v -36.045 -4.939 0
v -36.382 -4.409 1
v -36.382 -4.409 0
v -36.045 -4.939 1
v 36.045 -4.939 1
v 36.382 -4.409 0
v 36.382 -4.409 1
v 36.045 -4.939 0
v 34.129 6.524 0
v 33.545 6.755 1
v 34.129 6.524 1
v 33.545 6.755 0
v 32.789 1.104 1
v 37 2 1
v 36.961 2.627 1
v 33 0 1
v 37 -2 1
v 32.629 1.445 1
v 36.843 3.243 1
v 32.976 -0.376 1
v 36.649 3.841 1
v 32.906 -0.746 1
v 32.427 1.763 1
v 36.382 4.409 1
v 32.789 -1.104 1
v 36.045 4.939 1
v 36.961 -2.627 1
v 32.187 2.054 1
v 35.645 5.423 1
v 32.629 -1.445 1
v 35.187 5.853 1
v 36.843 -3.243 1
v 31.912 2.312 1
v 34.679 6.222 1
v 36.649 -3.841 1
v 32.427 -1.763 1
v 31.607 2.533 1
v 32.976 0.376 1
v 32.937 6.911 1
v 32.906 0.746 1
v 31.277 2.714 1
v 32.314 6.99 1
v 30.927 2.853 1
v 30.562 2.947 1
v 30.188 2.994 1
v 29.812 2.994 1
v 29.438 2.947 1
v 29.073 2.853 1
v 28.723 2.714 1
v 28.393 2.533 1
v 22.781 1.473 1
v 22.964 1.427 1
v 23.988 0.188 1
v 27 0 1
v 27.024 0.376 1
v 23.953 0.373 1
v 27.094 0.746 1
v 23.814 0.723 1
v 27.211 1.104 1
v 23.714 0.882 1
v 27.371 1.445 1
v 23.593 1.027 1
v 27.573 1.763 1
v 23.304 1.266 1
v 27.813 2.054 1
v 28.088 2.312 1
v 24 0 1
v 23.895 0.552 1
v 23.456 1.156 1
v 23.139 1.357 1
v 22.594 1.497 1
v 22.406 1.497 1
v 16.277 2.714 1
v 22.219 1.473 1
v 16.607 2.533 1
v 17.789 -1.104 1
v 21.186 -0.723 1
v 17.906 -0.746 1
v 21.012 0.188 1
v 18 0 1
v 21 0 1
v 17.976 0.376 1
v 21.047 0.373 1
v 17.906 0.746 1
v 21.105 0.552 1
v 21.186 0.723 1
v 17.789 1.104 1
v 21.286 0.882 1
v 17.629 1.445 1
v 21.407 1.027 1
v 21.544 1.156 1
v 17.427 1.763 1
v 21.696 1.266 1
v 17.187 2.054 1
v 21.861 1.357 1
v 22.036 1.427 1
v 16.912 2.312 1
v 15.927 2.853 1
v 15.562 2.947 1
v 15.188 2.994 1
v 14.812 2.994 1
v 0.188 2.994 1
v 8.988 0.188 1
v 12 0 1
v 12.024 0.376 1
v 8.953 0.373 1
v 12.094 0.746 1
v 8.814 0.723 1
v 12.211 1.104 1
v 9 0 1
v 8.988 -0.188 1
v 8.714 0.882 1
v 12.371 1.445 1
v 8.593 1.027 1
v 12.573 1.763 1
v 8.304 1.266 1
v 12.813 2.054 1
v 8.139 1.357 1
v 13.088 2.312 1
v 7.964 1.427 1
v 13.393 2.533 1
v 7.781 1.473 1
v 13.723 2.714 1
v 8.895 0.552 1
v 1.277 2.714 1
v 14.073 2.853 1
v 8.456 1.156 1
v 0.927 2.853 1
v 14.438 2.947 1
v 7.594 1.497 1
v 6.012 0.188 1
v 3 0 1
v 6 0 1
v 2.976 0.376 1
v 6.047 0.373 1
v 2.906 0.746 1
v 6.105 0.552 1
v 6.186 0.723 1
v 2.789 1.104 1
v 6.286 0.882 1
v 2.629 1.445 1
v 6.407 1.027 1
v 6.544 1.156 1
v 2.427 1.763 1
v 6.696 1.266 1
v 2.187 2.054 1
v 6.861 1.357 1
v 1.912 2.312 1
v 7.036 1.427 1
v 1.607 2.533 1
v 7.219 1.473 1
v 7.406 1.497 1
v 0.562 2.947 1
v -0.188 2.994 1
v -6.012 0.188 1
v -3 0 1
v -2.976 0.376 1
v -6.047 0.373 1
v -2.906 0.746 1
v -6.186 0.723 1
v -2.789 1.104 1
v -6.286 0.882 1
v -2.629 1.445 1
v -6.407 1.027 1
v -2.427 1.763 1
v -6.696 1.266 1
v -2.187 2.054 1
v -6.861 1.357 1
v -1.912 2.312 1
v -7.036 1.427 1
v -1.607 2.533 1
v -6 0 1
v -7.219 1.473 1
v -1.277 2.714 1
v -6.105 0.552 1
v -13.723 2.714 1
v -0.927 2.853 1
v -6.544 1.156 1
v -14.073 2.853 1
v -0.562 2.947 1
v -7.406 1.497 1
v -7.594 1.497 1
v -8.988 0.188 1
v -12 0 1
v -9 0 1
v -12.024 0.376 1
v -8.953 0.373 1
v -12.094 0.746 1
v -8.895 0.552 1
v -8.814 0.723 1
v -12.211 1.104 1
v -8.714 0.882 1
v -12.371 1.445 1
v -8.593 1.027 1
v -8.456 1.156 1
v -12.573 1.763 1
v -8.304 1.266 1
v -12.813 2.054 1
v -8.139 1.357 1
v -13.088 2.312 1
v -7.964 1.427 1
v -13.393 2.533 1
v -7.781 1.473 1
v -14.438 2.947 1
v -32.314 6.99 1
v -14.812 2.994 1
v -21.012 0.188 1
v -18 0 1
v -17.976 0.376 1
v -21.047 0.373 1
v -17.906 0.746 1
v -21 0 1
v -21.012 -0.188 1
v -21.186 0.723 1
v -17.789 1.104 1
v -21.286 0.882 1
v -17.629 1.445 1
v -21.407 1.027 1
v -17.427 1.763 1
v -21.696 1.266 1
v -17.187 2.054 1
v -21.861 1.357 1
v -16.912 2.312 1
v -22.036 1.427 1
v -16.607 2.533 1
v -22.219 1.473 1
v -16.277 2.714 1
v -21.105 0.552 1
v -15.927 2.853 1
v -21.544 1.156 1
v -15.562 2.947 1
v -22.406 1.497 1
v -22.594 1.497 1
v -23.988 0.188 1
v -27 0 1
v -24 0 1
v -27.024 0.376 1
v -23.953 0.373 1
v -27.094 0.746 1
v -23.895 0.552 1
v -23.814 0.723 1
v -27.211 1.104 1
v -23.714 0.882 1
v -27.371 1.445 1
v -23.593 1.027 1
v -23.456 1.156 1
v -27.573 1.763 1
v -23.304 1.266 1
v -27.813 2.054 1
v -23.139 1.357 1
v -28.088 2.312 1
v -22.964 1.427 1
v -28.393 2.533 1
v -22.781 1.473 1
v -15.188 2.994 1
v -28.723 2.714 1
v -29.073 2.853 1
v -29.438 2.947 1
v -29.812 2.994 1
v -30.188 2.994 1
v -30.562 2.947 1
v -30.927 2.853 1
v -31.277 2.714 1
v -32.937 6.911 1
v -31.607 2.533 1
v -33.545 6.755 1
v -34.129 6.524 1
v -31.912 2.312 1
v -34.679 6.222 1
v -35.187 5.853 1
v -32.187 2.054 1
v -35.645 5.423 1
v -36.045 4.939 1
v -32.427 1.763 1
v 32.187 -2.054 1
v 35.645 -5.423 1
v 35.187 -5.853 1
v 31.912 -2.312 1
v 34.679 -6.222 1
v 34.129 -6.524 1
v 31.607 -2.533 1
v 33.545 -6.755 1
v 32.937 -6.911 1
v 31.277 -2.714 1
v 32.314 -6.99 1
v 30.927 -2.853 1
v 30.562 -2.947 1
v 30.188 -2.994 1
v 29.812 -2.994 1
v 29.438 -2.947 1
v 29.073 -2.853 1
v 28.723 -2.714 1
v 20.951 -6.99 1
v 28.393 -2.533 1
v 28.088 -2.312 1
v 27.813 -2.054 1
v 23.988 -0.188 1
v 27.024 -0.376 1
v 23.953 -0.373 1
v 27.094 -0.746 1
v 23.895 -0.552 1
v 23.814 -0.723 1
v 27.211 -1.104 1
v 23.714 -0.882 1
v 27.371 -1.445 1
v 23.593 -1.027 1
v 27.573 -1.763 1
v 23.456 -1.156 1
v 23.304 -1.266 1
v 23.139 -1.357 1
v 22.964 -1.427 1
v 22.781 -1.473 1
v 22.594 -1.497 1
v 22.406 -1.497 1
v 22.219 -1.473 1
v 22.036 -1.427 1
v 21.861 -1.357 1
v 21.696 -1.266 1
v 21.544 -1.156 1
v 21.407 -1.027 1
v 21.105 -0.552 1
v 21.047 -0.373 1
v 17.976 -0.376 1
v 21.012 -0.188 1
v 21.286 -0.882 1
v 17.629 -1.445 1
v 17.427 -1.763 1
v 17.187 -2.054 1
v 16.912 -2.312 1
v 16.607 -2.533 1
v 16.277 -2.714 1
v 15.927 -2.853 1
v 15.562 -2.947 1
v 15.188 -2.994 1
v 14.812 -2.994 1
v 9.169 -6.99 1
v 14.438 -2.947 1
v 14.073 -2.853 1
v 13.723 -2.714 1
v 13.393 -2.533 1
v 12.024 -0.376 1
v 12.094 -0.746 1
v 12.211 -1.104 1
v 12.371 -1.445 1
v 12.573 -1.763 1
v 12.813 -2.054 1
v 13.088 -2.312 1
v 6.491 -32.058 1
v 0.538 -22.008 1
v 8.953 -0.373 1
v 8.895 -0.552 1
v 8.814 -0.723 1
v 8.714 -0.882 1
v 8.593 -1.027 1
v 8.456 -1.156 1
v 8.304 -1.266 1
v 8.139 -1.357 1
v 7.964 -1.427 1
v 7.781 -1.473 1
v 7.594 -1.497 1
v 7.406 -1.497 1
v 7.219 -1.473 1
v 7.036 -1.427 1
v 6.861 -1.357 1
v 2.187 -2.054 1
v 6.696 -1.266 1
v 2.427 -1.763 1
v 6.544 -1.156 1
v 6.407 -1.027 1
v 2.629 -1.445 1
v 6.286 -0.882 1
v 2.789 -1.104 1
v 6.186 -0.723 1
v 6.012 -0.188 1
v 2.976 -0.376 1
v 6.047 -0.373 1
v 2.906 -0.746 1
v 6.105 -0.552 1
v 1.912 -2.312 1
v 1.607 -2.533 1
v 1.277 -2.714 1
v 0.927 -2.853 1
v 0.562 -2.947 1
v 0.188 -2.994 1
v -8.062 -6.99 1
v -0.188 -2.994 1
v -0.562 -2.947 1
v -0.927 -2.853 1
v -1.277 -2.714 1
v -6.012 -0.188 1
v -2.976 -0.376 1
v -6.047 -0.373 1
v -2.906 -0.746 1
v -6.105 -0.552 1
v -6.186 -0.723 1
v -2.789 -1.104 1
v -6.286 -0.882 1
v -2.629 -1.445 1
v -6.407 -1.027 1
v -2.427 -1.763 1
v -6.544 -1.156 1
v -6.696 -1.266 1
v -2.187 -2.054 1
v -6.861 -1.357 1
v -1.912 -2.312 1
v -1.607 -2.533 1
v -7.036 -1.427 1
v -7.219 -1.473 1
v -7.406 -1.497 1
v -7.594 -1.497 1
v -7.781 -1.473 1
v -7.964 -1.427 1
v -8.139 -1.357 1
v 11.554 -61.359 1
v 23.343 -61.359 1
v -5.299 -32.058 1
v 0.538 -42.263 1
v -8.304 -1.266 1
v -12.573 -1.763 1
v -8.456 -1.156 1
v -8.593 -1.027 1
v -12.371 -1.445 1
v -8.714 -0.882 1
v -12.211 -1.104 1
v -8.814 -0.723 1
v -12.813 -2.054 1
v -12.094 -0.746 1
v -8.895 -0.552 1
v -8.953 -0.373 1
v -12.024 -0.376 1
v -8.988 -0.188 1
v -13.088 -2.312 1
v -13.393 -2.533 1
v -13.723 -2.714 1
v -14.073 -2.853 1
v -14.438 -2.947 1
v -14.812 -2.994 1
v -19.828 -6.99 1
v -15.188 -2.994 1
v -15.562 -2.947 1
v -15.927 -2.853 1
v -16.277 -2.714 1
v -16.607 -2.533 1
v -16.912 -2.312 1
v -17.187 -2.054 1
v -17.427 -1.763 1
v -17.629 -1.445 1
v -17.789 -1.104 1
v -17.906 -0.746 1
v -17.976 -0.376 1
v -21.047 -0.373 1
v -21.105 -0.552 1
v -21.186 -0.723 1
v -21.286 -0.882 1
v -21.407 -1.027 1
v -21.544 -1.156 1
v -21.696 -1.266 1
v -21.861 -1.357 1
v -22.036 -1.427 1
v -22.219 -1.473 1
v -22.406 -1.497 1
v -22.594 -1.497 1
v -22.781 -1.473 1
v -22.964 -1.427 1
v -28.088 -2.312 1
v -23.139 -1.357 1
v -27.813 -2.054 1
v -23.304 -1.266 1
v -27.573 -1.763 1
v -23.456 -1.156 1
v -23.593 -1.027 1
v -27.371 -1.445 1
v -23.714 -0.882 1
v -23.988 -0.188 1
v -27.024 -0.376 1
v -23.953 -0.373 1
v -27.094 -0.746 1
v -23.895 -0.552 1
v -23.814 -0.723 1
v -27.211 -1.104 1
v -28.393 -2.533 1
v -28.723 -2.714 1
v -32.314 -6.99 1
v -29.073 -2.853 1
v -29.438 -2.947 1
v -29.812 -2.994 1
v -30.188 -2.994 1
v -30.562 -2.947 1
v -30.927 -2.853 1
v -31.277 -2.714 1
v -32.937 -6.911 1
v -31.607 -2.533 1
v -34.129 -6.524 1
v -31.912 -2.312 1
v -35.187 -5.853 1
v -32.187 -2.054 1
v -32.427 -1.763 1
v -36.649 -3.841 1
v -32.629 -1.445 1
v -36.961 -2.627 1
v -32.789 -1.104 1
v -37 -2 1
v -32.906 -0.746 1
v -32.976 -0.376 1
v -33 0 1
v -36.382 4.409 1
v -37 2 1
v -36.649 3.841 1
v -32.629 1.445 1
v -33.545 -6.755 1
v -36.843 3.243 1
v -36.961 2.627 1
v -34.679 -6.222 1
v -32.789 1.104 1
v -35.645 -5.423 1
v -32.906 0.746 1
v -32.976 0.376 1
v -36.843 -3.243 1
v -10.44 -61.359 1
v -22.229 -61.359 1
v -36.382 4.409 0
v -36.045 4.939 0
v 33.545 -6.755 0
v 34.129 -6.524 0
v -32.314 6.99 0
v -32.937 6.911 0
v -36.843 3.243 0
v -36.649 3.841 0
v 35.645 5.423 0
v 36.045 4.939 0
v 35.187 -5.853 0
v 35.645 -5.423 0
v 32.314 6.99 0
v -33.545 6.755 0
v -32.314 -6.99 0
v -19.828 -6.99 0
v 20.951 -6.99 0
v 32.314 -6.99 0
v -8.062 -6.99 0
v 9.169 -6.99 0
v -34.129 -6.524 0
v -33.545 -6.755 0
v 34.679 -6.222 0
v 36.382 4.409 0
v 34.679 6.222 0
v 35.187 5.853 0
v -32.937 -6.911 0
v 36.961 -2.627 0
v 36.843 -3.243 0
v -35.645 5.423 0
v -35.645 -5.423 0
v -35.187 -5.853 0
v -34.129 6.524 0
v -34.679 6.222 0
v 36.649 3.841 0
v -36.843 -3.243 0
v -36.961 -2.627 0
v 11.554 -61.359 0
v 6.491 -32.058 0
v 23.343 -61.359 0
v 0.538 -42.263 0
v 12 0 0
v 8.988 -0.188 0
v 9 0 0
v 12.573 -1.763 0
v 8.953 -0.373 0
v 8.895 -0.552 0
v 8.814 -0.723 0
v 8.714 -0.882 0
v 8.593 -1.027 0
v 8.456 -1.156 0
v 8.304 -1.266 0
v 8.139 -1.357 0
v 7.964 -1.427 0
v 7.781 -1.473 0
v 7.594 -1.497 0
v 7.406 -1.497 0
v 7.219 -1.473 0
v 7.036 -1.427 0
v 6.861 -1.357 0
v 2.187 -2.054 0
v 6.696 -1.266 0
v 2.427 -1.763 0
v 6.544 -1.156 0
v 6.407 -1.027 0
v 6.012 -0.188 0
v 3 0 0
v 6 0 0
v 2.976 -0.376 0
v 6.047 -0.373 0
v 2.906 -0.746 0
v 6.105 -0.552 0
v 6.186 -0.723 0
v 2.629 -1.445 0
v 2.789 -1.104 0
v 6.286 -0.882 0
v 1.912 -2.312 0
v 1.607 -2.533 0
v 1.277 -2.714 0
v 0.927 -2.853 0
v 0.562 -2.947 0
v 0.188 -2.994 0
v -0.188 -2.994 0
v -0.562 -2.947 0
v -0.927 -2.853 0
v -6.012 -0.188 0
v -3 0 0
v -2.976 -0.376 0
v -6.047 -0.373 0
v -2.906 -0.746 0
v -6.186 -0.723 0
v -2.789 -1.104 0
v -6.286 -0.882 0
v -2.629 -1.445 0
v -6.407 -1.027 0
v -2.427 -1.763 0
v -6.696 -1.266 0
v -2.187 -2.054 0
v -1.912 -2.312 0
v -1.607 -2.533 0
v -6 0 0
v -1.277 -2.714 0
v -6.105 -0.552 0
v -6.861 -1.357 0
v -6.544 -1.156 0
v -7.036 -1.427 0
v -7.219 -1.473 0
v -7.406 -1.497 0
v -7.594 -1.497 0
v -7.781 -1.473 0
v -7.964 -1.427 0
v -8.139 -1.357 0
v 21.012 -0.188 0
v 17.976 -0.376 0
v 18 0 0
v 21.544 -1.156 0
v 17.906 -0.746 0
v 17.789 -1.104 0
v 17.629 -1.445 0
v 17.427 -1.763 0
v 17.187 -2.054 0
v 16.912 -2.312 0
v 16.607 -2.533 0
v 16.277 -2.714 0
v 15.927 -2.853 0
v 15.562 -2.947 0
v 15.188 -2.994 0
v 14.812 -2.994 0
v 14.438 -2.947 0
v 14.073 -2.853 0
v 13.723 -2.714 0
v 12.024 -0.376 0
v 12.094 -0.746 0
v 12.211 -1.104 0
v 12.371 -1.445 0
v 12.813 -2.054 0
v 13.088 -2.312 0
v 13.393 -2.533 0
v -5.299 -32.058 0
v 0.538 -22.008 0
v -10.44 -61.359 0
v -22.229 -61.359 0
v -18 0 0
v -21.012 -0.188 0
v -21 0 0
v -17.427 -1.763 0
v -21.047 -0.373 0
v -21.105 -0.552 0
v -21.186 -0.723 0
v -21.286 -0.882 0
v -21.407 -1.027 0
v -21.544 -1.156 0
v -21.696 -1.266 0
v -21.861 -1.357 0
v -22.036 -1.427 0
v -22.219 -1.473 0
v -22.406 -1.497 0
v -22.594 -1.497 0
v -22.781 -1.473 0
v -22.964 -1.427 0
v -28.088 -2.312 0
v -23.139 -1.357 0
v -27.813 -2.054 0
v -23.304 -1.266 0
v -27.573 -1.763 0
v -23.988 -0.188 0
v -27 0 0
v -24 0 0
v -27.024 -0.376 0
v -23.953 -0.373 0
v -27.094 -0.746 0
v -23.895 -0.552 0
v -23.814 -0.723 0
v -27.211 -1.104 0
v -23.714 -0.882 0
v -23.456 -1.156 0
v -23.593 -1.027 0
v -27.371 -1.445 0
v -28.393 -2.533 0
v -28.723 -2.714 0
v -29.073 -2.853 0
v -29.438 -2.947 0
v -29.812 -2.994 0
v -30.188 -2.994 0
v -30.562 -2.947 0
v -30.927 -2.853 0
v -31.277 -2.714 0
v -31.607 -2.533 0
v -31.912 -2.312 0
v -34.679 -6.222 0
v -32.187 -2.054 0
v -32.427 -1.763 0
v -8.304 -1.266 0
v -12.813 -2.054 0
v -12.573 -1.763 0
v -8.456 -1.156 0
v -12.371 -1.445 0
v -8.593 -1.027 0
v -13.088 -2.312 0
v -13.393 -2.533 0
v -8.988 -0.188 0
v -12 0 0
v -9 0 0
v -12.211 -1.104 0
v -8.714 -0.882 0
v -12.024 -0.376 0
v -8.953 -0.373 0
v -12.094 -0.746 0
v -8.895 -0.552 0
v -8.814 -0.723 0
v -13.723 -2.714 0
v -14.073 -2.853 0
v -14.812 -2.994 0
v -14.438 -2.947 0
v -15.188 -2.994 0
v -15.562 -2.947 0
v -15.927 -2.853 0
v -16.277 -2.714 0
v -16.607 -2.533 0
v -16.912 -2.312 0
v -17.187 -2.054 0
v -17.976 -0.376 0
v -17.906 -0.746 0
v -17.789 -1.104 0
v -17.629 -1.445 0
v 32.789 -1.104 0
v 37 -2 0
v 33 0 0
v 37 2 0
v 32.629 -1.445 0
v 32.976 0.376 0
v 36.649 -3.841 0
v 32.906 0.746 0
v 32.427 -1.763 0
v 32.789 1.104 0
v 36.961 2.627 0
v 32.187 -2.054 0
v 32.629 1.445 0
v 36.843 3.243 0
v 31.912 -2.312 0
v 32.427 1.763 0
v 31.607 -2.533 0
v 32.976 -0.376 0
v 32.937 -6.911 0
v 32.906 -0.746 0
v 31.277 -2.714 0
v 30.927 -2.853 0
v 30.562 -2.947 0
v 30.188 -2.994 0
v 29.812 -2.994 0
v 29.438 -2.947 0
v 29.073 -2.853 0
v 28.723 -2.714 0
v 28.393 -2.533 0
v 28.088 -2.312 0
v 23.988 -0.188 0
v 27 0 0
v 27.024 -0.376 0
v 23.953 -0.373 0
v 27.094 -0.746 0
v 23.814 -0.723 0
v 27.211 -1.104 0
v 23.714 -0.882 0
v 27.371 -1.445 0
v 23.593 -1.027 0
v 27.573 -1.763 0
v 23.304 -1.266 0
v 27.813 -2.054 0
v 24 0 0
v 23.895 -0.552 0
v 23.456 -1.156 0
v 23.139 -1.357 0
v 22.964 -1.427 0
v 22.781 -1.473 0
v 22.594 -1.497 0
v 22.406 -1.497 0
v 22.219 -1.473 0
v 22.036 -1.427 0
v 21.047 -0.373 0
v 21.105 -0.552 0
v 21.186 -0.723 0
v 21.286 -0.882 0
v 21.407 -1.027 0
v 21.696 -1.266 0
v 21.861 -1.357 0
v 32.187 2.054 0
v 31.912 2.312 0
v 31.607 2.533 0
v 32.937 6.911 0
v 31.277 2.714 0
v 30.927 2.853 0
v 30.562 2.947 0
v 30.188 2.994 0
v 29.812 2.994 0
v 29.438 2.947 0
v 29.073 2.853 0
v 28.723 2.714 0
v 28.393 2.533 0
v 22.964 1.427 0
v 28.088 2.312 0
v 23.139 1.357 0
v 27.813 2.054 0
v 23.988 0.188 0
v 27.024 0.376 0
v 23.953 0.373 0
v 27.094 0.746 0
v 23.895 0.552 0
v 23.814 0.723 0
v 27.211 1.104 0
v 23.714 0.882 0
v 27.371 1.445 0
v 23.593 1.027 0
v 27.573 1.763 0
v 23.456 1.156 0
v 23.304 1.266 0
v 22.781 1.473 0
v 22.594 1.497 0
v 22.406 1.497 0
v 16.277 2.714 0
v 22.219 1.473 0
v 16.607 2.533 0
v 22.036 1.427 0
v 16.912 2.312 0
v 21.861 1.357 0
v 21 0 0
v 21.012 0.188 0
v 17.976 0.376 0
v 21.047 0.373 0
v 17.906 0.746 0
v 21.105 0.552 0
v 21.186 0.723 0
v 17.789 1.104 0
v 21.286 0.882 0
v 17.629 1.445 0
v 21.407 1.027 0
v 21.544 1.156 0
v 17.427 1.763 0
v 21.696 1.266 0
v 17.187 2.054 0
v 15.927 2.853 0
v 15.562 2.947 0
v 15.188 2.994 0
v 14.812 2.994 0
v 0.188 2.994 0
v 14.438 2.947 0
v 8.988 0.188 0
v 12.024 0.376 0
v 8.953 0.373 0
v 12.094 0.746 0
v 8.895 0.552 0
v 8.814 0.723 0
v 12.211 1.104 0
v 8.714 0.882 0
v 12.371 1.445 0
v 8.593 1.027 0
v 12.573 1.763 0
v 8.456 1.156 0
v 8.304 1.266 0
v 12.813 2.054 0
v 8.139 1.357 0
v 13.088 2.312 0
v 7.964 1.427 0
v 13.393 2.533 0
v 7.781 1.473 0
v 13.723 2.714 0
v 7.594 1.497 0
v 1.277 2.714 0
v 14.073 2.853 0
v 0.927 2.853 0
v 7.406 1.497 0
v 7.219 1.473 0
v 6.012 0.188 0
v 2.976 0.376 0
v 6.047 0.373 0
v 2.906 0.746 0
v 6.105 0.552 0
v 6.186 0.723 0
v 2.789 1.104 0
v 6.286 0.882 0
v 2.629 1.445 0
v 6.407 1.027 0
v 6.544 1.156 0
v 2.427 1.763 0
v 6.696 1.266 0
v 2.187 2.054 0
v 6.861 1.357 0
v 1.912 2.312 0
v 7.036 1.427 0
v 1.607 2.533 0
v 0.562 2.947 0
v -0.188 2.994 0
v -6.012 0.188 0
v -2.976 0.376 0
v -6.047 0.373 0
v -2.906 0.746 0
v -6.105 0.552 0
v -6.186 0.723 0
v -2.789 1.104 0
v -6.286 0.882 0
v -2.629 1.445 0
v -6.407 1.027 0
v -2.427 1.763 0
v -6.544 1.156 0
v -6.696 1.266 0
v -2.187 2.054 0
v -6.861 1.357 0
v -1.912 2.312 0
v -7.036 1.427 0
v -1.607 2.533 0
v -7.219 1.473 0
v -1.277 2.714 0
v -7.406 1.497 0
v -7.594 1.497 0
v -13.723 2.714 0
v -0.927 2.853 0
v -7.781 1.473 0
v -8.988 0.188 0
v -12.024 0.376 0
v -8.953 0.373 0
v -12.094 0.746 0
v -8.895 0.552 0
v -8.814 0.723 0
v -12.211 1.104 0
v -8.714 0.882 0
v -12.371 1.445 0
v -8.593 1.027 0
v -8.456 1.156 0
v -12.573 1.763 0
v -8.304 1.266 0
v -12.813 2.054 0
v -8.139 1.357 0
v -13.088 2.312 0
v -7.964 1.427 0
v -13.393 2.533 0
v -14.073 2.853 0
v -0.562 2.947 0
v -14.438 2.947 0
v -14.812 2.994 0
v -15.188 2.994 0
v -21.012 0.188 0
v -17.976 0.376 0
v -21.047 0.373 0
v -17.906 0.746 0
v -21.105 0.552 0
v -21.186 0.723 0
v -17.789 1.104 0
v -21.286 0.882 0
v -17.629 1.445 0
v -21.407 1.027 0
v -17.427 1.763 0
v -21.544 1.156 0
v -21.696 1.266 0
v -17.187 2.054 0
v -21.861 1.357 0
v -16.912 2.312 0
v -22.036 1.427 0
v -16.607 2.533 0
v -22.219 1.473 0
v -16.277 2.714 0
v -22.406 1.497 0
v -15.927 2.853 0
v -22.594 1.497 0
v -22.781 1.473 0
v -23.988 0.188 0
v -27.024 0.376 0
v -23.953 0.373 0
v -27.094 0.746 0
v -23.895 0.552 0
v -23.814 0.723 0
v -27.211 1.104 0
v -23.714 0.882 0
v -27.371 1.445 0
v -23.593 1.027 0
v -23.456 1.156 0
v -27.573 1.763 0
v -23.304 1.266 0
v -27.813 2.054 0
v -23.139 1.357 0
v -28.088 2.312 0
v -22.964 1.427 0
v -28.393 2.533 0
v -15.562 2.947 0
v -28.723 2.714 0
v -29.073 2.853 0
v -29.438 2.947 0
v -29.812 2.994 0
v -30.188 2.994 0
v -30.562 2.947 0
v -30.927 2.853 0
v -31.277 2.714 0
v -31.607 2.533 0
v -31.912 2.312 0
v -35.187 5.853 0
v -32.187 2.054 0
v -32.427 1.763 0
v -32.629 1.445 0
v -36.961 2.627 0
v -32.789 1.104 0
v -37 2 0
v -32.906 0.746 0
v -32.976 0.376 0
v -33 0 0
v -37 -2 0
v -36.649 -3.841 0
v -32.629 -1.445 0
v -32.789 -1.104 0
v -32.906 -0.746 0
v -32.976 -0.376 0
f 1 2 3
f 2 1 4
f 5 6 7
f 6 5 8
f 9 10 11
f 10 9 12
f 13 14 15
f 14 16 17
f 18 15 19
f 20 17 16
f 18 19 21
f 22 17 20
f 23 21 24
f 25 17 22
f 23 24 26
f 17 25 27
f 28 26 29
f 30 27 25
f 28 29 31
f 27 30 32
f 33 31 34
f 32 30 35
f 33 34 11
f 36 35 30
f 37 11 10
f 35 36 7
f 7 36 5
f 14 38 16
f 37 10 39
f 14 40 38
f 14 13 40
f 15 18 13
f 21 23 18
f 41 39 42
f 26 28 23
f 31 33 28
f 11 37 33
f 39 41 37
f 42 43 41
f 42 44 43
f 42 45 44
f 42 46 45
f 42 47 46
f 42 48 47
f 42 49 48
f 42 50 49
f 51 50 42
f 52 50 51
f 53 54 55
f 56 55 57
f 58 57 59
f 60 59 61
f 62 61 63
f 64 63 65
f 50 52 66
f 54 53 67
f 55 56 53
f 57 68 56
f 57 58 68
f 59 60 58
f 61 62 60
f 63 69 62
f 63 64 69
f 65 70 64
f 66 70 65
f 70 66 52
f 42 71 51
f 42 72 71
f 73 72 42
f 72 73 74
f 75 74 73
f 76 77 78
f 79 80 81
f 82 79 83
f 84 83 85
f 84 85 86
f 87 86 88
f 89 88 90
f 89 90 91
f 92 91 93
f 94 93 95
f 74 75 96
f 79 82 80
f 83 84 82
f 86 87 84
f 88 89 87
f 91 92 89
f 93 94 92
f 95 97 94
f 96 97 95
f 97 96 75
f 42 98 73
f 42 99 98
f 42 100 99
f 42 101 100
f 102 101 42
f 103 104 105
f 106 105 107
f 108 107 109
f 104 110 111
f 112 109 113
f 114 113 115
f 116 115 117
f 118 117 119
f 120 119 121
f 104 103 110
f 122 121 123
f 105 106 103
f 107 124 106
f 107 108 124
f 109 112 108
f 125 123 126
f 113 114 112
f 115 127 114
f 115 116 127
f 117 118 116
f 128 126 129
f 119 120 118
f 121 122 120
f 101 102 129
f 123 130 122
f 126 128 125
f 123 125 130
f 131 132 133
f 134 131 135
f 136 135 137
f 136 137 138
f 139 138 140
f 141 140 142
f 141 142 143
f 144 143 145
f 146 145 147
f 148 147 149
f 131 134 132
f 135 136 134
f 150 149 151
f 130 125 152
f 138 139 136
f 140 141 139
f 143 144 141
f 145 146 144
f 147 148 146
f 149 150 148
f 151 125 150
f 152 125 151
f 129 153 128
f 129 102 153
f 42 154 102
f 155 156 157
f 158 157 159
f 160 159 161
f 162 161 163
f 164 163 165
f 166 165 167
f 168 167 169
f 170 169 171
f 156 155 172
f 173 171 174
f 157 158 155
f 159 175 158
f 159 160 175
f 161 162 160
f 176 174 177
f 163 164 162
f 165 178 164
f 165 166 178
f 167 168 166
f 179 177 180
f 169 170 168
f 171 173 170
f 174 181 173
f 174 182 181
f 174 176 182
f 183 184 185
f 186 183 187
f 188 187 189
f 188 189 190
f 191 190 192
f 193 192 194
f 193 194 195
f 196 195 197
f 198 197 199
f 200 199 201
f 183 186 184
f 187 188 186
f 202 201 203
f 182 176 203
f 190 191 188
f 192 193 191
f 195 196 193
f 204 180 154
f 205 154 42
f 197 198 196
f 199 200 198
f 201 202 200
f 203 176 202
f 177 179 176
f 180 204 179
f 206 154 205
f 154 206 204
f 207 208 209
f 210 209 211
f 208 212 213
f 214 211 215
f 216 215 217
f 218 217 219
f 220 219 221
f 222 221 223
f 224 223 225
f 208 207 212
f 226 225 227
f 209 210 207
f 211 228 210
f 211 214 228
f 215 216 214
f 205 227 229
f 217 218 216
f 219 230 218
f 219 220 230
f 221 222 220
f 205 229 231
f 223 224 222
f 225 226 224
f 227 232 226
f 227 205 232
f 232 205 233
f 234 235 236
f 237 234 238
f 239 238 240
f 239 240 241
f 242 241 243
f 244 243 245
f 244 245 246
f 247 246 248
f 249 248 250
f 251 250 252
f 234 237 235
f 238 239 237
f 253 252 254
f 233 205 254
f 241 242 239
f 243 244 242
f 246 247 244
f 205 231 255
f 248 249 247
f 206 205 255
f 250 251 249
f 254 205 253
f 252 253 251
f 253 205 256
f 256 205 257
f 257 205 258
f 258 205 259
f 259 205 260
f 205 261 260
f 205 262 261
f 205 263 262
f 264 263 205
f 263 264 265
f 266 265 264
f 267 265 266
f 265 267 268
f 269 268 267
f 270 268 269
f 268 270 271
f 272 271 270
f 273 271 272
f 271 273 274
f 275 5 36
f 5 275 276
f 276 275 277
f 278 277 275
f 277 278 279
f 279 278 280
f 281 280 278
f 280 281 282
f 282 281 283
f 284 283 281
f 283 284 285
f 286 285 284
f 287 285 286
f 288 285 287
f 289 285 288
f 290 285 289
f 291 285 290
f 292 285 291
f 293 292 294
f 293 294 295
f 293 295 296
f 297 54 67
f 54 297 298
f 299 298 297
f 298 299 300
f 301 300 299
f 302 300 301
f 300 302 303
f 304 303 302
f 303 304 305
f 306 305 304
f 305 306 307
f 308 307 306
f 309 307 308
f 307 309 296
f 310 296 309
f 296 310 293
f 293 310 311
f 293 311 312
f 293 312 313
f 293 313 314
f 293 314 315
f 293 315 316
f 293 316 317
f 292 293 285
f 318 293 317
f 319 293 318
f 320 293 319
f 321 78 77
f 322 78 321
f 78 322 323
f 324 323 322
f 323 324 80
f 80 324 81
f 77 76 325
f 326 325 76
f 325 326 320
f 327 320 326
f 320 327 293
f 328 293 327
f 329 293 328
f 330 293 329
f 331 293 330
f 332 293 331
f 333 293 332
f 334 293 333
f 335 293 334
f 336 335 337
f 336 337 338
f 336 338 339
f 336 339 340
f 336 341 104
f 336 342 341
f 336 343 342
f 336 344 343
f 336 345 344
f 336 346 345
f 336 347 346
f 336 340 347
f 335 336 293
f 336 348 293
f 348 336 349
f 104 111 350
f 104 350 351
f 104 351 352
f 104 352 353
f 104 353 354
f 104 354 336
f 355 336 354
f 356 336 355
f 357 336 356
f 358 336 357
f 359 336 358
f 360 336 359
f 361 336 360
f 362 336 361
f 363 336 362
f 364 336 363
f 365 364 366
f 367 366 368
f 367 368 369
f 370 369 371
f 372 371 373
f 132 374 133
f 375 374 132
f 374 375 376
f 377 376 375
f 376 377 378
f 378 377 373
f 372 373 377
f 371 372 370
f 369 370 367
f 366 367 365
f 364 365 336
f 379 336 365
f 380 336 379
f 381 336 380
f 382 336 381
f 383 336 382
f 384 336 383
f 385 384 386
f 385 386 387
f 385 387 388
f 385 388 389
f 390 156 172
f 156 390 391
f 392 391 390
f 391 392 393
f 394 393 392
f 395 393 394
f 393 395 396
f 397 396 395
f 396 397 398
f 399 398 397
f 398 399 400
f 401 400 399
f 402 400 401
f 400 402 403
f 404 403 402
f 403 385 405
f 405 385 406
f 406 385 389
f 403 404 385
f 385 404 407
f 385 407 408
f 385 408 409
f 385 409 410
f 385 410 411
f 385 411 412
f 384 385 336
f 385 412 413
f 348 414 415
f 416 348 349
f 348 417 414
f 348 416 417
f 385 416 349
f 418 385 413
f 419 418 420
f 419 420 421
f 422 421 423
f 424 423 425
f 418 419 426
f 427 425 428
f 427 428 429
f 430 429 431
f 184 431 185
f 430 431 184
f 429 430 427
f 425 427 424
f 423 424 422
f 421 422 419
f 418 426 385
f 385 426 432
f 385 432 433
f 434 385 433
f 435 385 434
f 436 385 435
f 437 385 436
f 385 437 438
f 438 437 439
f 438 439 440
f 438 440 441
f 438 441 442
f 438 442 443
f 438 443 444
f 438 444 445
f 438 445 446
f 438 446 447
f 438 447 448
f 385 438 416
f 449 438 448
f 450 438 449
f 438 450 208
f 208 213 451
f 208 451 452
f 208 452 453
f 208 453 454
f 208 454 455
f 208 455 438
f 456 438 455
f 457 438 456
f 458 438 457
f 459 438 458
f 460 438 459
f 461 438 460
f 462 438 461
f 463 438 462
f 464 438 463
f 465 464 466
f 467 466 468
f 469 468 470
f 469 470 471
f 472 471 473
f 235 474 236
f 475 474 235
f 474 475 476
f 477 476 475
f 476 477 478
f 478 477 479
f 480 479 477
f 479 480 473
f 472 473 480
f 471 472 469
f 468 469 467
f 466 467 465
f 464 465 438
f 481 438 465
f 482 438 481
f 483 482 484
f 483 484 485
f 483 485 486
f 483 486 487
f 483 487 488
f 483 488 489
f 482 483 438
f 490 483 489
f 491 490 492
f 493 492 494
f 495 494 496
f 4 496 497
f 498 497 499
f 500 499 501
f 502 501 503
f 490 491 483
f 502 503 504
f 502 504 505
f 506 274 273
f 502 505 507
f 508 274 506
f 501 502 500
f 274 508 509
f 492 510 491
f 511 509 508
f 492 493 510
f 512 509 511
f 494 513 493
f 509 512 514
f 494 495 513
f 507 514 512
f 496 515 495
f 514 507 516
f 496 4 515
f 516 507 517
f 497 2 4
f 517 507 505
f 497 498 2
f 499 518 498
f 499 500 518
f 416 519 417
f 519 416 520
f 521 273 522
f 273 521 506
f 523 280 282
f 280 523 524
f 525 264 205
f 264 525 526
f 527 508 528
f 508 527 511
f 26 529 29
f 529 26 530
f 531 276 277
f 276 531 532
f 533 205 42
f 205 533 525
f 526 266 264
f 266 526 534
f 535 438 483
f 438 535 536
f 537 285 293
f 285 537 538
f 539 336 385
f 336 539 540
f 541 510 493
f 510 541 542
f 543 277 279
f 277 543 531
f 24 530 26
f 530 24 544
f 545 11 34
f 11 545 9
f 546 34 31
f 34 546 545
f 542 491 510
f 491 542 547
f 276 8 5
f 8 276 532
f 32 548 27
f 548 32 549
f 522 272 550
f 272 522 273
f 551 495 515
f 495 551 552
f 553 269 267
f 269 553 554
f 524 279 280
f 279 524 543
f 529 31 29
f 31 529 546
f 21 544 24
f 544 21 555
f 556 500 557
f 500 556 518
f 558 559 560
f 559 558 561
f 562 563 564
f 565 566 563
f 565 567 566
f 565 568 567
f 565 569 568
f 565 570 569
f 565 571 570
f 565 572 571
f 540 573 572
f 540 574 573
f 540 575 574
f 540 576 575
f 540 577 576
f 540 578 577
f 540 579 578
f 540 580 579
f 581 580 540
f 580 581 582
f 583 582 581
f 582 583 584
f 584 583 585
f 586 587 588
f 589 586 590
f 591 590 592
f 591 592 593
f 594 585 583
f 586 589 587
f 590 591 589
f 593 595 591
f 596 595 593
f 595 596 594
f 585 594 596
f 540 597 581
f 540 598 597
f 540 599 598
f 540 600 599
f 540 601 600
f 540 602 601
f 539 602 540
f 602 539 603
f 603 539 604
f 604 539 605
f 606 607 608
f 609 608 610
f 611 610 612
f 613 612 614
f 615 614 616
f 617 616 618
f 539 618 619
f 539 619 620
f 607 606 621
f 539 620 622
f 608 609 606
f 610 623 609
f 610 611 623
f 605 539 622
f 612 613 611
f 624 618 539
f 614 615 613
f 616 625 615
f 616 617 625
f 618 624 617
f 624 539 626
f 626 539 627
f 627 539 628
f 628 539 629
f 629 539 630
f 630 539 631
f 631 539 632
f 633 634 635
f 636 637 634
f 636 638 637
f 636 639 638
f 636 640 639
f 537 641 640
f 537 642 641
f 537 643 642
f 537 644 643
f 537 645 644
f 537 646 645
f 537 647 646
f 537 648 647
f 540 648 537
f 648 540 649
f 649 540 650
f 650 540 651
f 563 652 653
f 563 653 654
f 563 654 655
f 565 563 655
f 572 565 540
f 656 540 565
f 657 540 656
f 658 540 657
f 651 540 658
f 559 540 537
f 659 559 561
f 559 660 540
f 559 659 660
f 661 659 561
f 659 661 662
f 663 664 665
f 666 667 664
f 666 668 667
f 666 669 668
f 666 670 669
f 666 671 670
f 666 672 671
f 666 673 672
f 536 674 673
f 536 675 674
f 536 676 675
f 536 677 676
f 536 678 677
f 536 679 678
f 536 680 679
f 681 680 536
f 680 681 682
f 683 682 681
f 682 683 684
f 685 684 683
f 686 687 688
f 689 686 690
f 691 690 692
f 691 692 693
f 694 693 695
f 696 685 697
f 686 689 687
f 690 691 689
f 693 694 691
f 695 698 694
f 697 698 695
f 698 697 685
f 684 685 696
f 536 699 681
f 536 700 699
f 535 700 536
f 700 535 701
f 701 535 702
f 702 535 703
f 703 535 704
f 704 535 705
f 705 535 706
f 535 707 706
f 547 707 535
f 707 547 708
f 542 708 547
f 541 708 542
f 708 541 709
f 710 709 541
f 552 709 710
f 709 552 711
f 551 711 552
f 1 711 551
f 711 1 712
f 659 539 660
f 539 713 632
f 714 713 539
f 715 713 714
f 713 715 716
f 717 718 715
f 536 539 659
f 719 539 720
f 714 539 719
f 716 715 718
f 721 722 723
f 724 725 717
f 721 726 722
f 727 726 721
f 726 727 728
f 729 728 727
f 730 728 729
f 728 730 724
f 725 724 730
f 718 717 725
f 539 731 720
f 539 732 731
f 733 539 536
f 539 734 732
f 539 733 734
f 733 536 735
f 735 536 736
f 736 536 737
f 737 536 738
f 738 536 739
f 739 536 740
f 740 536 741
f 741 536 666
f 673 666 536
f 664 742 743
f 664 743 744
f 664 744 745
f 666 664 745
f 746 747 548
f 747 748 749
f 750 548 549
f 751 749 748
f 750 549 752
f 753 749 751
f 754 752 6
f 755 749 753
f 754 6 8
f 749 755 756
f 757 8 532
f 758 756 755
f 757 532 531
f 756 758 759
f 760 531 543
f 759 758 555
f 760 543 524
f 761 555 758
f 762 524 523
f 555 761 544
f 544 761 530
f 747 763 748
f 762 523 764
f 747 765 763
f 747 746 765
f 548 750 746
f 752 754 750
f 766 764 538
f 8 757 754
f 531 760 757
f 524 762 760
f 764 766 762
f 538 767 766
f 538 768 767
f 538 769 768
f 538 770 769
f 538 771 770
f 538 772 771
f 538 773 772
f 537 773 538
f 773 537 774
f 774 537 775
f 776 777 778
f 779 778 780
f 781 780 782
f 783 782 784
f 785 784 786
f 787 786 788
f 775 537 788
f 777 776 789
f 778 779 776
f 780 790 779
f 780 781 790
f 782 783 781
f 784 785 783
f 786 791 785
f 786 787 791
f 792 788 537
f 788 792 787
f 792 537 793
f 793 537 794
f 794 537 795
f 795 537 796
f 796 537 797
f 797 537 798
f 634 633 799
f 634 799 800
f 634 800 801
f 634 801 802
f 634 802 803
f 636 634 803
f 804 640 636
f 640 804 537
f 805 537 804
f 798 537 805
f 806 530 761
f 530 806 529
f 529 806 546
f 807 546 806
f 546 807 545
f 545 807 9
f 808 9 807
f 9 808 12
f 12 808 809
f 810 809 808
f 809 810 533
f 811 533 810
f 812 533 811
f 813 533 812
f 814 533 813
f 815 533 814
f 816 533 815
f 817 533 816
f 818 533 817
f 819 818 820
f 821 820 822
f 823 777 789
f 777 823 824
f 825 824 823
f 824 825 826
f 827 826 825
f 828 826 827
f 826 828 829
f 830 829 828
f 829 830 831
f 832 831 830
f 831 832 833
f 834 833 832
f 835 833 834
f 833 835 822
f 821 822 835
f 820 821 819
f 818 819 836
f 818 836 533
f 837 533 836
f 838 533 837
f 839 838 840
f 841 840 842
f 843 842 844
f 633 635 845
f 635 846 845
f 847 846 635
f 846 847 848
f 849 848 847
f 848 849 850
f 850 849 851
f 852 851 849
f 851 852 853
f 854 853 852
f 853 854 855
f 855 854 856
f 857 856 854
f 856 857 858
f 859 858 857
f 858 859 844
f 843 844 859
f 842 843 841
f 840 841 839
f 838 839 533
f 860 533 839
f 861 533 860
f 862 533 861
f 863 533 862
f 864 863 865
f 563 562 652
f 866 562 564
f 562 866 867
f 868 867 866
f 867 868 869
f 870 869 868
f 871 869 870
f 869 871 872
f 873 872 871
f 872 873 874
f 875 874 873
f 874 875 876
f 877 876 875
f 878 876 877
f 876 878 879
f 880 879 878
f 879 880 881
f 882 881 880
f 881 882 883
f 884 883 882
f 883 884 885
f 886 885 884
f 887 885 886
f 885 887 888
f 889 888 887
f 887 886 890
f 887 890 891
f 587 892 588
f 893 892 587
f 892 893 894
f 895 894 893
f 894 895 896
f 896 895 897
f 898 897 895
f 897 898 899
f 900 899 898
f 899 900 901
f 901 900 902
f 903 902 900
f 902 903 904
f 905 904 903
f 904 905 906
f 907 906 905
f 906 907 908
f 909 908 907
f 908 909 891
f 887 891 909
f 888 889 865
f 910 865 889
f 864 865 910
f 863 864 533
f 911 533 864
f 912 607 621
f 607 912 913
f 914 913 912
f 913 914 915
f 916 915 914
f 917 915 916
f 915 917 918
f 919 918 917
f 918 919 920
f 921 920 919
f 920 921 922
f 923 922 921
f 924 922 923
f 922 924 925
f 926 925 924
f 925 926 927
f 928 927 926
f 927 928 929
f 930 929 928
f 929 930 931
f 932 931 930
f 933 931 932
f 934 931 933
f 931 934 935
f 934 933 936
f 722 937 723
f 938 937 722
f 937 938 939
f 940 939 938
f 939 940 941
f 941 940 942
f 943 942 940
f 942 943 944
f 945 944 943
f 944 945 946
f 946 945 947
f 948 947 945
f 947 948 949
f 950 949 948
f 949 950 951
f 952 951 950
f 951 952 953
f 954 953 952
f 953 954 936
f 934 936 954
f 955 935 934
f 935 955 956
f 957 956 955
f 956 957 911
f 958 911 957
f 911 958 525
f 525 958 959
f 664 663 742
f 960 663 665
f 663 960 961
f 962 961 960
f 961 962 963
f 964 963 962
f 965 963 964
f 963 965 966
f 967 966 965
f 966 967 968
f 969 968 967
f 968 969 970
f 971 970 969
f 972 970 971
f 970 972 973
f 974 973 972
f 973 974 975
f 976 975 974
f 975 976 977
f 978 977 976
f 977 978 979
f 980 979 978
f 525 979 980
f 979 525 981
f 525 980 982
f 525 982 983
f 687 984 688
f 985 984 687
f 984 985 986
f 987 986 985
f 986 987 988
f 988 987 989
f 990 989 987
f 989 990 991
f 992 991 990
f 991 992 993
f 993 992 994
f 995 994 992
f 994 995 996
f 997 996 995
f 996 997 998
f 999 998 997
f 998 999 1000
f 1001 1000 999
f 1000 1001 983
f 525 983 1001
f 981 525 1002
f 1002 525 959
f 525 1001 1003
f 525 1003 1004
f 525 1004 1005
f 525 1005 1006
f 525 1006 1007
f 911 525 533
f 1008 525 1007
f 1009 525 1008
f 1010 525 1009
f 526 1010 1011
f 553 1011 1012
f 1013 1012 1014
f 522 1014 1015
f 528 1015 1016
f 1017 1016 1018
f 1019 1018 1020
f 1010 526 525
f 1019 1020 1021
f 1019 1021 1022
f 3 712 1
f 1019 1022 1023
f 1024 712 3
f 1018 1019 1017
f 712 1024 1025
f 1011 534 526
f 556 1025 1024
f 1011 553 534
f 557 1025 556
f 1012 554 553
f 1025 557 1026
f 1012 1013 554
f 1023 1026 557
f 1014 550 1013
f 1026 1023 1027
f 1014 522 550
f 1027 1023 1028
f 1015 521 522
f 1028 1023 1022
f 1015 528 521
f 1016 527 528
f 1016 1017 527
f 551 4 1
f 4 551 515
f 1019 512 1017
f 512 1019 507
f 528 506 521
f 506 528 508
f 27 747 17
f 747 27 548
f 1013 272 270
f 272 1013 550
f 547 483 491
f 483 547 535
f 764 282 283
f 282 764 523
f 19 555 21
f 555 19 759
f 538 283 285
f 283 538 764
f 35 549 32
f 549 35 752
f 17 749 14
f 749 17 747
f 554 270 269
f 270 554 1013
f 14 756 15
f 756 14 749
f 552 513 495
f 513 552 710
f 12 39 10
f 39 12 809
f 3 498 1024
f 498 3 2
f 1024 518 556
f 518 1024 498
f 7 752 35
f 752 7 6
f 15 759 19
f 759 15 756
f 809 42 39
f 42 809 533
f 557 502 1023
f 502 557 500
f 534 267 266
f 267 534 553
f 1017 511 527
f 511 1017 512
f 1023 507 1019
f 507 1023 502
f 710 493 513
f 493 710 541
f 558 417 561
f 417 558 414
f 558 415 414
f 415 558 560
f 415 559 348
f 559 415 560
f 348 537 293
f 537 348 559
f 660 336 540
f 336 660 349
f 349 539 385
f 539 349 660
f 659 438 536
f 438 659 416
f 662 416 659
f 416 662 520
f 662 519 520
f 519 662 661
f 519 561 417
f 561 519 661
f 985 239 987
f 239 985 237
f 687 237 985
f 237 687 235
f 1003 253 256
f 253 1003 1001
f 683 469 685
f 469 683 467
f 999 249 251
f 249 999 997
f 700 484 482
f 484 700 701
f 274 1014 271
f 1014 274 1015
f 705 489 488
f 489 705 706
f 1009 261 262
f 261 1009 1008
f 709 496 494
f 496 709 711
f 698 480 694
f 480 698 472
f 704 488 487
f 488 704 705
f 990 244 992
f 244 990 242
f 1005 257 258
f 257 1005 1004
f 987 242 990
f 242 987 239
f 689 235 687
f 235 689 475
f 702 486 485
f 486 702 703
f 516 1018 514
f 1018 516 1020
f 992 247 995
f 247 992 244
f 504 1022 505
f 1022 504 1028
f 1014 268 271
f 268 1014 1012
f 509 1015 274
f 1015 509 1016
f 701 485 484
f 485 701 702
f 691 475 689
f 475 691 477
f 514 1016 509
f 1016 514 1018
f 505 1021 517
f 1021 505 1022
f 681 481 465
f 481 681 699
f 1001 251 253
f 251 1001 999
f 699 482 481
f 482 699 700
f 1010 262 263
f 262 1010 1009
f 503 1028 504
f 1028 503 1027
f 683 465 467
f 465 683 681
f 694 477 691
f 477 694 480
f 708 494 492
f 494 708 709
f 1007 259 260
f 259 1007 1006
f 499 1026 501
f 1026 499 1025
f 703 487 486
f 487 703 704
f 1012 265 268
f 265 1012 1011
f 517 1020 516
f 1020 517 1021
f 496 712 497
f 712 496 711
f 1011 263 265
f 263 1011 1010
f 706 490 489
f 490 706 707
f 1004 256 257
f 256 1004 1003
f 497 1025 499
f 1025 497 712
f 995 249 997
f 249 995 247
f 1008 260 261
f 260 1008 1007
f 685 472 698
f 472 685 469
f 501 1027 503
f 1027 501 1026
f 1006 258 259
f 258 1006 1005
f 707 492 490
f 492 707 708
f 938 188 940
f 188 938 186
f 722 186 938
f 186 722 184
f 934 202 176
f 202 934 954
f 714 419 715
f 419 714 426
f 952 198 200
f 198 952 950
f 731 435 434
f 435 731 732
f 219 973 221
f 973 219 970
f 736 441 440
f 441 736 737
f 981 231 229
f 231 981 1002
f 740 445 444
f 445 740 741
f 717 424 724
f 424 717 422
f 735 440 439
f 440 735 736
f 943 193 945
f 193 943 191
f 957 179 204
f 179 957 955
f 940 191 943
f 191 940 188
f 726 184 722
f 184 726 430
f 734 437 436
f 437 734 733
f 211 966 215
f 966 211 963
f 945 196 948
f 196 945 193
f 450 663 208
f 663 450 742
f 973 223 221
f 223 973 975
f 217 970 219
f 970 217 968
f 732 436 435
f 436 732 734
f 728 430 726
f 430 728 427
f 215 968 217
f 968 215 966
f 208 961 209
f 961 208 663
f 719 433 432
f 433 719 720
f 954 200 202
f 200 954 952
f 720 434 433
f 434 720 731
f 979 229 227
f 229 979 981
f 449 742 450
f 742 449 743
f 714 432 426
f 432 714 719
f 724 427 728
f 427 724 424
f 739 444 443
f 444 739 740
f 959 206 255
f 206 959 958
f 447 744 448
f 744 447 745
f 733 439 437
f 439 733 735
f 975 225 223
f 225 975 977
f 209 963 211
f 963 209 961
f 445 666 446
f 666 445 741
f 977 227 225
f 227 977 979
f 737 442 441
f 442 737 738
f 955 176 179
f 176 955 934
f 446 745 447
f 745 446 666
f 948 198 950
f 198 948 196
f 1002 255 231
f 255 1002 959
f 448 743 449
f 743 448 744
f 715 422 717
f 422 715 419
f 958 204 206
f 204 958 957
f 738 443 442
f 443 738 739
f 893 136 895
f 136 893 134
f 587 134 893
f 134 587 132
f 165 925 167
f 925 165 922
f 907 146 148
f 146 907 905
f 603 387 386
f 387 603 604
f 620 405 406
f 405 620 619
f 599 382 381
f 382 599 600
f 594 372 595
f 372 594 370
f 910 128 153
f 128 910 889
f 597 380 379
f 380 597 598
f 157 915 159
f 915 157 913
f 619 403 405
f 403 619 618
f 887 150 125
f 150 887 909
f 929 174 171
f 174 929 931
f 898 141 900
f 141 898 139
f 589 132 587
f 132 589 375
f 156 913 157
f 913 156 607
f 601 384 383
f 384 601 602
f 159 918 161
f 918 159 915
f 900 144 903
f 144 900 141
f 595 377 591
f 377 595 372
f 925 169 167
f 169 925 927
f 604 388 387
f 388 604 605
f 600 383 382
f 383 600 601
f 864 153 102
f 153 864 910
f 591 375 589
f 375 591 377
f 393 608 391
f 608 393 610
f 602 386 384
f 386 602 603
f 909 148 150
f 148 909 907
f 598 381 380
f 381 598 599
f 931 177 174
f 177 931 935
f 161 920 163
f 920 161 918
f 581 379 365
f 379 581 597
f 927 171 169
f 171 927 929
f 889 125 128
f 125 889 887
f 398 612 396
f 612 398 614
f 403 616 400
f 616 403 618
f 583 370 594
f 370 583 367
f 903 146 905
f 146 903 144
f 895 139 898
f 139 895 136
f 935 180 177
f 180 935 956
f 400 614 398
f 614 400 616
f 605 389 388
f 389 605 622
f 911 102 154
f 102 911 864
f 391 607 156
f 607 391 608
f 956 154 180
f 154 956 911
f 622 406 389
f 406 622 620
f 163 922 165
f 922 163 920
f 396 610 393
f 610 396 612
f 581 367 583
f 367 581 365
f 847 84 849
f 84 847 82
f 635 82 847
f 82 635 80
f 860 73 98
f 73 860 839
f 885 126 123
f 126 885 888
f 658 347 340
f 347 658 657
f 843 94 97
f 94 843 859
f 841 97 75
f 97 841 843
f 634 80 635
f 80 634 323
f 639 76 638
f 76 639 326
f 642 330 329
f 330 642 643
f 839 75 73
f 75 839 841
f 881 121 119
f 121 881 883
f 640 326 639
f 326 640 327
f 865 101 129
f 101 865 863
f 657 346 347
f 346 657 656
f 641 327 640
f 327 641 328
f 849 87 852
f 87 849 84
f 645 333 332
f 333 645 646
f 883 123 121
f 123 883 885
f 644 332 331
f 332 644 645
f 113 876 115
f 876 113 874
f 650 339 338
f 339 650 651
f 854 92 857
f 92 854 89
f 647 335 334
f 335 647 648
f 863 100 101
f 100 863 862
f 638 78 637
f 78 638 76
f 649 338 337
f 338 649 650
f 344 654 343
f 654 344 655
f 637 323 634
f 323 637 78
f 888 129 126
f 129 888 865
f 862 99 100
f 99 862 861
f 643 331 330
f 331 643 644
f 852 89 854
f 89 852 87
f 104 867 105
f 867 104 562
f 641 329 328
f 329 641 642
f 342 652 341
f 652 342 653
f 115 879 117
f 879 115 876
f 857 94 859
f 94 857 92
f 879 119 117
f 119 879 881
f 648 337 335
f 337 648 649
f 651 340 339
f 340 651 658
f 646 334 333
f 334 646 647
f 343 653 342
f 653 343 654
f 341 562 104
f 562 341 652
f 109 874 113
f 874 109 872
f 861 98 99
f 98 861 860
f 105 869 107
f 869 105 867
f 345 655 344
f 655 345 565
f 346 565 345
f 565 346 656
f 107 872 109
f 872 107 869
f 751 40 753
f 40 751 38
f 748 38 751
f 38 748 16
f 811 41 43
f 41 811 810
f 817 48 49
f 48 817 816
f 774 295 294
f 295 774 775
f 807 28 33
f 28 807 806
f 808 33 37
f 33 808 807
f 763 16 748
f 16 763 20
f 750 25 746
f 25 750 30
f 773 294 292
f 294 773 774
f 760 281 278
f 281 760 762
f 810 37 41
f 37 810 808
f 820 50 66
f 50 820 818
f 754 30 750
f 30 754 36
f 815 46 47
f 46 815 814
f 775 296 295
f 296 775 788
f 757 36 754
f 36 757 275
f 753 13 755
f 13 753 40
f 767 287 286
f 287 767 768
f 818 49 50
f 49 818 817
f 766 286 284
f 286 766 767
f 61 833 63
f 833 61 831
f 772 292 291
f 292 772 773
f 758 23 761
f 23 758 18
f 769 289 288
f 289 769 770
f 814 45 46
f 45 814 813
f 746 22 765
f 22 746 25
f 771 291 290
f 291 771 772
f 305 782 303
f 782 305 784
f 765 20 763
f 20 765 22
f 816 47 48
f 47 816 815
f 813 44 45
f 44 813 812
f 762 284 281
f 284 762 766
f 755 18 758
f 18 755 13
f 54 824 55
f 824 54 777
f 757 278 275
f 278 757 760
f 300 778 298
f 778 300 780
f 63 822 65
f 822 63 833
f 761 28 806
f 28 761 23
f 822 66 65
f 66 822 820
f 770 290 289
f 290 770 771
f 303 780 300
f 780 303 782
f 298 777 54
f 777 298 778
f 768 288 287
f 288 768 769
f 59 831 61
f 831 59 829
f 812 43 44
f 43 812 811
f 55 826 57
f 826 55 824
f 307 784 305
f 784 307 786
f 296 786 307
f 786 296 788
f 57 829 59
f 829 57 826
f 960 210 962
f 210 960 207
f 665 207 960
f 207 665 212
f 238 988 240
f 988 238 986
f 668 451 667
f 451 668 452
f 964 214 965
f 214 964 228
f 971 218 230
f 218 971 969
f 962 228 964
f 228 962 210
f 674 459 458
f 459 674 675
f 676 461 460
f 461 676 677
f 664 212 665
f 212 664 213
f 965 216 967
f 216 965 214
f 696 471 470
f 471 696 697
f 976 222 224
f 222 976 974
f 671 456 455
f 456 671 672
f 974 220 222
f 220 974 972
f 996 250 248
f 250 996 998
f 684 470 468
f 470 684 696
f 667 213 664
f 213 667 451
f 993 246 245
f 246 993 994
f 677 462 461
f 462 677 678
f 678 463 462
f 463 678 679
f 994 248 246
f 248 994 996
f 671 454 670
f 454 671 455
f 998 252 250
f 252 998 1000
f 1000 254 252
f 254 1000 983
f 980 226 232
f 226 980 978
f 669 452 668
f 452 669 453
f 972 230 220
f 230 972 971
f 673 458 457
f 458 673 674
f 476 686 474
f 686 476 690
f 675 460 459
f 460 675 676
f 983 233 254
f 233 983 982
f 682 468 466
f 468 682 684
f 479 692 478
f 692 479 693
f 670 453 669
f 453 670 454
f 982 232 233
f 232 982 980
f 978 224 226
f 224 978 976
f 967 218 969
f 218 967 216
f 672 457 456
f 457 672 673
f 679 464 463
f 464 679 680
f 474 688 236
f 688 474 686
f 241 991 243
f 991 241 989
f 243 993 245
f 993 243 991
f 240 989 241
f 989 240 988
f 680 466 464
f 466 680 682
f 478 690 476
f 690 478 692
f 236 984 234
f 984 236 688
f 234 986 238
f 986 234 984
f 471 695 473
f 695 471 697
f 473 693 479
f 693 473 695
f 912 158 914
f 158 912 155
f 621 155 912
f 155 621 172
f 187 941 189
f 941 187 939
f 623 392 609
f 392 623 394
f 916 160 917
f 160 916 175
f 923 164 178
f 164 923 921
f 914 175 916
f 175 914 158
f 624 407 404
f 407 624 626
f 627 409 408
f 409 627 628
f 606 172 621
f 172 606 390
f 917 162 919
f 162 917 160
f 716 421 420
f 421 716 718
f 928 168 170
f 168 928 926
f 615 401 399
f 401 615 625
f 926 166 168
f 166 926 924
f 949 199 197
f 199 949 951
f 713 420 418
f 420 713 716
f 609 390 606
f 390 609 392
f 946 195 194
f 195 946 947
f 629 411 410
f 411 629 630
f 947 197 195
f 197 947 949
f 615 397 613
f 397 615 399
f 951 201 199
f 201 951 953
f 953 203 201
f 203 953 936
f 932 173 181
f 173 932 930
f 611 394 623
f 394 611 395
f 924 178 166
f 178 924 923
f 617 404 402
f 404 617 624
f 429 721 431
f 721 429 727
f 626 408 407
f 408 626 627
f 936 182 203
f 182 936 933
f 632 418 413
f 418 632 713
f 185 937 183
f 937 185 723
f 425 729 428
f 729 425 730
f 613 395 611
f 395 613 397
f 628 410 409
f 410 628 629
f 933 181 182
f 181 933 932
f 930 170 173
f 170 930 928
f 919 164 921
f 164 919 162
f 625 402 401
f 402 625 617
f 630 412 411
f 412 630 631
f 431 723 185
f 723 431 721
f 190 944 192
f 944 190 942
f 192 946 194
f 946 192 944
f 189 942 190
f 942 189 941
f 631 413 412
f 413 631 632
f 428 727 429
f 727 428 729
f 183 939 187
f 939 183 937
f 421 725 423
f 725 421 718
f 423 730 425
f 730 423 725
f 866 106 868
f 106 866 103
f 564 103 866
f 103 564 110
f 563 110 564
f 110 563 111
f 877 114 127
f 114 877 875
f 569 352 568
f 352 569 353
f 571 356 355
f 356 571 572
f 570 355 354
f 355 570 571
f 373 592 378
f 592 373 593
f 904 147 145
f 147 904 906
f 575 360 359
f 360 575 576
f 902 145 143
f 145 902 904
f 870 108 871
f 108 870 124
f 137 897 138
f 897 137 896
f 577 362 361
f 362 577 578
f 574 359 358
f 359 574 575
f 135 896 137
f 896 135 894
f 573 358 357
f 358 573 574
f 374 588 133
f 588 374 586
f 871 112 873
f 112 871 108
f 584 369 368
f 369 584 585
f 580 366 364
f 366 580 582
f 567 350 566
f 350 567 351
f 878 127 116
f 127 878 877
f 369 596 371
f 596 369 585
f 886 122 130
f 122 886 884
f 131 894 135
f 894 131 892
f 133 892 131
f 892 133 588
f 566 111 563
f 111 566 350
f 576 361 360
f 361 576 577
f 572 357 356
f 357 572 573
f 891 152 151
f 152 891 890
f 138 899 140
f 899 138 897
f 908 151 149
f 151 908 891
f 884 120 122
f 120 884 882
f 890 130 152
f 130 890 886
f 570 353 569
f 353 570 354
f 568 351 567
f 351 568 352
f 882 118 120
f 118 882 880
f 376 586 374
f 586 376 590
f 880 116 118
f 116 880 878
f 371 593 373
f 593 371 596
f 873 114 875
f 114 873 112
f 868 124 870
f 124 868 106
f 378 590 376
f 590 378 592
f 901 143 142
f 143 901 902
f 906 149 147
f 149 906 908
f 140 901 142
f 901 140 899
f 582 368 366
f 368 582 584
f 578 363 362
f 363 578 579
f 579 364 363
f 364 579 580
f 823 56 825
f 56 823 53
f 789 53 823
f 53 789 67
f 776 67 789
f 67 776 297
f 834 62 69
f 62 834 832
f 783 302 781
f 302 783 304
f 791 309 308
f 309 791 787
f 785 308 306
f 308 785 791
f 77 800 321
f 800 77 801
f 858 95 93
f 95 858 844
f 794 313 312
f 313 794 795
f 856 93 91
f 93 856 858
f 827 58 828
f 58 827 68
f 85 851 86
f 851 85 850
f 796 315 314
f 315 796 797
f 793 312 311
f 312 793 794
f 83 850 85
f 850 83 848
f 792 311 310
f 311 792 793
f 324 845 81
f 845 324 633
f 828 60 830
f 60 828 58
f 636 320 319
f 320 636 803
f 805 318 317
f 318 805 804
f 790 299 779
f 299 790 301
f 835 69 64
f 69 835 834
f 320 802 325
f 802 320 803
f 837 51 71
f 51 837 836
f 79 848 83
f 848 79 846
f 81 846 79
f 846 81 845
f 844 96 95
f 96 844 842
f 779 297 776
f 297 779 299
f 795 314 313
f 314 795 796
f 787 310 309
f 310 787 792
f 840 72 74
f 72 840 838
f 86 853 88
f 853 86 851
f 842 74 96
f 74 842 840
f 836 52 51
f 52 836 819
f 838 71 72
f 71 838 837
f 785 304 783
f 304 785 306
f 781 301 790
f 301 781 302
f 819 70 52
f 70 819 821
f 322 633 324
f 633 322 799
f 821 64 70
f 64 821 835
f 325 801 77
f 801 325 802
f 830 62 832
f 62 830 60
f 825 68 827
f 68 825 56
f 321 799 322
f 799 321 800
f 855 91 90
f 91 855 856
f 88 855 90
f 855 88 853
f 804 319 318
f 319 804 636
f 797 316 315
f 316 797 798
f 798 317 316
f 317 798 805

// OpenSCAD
$fn = 50;


difference() {
	union() {
		hull() {
			translate(v = [-32.0000000000, 2.0000000000, 0]) {
				cylinder(h = 1, r = 5);
			}
			translate(v = [32.0000000000, 2.0000000000, 0]) {
				cylinder(h = 1, r = 5);
			}
			translate(v = [-32.0000000000, -2.0000000000, 0]) {
				cylinder(h = 1, r = 5);
			}
			translate(v = [32.0000000000, -2.0000000000, 0]) {
				cylinder(h = 1, r = 5);
			}
		}
		translate(v = [0, -5, 0]) {
			linear_extrude(height = 1) {
				text(font = "DejaVu Sans Mono:style=Bold", halign = "center", size = 57.0000000000, text = "X", valign = "top");
			}
		}
	}
	union() {
		translate(v = [-30.0000000000, 0.0000000000, 0]) {
			translate(v = [0, 0, -100]) {
				cylinder(h = 200, r = 3.0000000000);
			}
		}
		translate(v = [-15.0000000000, 0.0000000000, 0]) {
			translate(v = [0, 0, -100]) {
				cylinder(h = 200, r = 3.0000000000);
			}
		}
		translate(v = [0, 0, -100]) {
			cylinder(h = 200, r = 3.0000000000);
		}
		translate(v = [15.0000000000, 0.0000000000, 0]) {
			translate(v = [0, 0, -100]) {
				cylinder(h = 200, r = 3.0000000000);
			}
		}
		translate(v = [30.0000000000, 0.0000000000, 0]) {
			translate(v = [0, 0, -100]) {
				cylinder(h = 200, r = 3.0000000000);
			}
		}
		translate(v = [-30.0000000000, 0.0000000000, 0]) {
			translate(v = [0, 0, -100]) {
				cylinder(h = 200, r = 1.5000000000);
			}
		}
		translate(v = [-22.5000000000, 0.0000000000, 0]) {
			translate(v = [0, 0, -100]) {
				cylinder(h = 200, r = 1.5000000000);
			}
		}
		translate(v = [-15.0000000000, 0.0000000000, 0]) {
			translate(v = [0, 0, -100]) {
				cylinder(h = 200, r = 1.5000000000);
			}
		}
		translate(v = [-7.5000000000, 0.0000000000, 0]) {
			translate(v = [0, 0, -100]) {
				cylinder(h = 200, r = 1.5000000000);
			}
		}
		translate(v = [0, 0, -100]) {
			cylinder(h = 200, r = 1.5000000000);
		}
		translate(v = [7.5000000000, 0.0000000000, 0]) {
			translate(v = [0, 0, -100]) {
				cylinder(h = 200, r = 1.5000000000);
			}
		}
		translate(v = [15.0000000000, 0.0000000000, 0]) {
			translate(v = [0, 0, -100]) {
				cylinder(h = 200, r = 1.5000000000);
			}
		}
		translate(v = [22.5000000000, 0.0000000000, 0]) {
			translate(v = [0, 0, -100]) {
				cylinder(h = 200, r = 1.5000000000);
			}
		}
		translate(v = [30.0000000000, 0.0000000000, 0]) {
			translate(v = [0, 0, -100]) {
				cylinder(h = 200, r = 1.5000000000);
			}
		}
	}
}
